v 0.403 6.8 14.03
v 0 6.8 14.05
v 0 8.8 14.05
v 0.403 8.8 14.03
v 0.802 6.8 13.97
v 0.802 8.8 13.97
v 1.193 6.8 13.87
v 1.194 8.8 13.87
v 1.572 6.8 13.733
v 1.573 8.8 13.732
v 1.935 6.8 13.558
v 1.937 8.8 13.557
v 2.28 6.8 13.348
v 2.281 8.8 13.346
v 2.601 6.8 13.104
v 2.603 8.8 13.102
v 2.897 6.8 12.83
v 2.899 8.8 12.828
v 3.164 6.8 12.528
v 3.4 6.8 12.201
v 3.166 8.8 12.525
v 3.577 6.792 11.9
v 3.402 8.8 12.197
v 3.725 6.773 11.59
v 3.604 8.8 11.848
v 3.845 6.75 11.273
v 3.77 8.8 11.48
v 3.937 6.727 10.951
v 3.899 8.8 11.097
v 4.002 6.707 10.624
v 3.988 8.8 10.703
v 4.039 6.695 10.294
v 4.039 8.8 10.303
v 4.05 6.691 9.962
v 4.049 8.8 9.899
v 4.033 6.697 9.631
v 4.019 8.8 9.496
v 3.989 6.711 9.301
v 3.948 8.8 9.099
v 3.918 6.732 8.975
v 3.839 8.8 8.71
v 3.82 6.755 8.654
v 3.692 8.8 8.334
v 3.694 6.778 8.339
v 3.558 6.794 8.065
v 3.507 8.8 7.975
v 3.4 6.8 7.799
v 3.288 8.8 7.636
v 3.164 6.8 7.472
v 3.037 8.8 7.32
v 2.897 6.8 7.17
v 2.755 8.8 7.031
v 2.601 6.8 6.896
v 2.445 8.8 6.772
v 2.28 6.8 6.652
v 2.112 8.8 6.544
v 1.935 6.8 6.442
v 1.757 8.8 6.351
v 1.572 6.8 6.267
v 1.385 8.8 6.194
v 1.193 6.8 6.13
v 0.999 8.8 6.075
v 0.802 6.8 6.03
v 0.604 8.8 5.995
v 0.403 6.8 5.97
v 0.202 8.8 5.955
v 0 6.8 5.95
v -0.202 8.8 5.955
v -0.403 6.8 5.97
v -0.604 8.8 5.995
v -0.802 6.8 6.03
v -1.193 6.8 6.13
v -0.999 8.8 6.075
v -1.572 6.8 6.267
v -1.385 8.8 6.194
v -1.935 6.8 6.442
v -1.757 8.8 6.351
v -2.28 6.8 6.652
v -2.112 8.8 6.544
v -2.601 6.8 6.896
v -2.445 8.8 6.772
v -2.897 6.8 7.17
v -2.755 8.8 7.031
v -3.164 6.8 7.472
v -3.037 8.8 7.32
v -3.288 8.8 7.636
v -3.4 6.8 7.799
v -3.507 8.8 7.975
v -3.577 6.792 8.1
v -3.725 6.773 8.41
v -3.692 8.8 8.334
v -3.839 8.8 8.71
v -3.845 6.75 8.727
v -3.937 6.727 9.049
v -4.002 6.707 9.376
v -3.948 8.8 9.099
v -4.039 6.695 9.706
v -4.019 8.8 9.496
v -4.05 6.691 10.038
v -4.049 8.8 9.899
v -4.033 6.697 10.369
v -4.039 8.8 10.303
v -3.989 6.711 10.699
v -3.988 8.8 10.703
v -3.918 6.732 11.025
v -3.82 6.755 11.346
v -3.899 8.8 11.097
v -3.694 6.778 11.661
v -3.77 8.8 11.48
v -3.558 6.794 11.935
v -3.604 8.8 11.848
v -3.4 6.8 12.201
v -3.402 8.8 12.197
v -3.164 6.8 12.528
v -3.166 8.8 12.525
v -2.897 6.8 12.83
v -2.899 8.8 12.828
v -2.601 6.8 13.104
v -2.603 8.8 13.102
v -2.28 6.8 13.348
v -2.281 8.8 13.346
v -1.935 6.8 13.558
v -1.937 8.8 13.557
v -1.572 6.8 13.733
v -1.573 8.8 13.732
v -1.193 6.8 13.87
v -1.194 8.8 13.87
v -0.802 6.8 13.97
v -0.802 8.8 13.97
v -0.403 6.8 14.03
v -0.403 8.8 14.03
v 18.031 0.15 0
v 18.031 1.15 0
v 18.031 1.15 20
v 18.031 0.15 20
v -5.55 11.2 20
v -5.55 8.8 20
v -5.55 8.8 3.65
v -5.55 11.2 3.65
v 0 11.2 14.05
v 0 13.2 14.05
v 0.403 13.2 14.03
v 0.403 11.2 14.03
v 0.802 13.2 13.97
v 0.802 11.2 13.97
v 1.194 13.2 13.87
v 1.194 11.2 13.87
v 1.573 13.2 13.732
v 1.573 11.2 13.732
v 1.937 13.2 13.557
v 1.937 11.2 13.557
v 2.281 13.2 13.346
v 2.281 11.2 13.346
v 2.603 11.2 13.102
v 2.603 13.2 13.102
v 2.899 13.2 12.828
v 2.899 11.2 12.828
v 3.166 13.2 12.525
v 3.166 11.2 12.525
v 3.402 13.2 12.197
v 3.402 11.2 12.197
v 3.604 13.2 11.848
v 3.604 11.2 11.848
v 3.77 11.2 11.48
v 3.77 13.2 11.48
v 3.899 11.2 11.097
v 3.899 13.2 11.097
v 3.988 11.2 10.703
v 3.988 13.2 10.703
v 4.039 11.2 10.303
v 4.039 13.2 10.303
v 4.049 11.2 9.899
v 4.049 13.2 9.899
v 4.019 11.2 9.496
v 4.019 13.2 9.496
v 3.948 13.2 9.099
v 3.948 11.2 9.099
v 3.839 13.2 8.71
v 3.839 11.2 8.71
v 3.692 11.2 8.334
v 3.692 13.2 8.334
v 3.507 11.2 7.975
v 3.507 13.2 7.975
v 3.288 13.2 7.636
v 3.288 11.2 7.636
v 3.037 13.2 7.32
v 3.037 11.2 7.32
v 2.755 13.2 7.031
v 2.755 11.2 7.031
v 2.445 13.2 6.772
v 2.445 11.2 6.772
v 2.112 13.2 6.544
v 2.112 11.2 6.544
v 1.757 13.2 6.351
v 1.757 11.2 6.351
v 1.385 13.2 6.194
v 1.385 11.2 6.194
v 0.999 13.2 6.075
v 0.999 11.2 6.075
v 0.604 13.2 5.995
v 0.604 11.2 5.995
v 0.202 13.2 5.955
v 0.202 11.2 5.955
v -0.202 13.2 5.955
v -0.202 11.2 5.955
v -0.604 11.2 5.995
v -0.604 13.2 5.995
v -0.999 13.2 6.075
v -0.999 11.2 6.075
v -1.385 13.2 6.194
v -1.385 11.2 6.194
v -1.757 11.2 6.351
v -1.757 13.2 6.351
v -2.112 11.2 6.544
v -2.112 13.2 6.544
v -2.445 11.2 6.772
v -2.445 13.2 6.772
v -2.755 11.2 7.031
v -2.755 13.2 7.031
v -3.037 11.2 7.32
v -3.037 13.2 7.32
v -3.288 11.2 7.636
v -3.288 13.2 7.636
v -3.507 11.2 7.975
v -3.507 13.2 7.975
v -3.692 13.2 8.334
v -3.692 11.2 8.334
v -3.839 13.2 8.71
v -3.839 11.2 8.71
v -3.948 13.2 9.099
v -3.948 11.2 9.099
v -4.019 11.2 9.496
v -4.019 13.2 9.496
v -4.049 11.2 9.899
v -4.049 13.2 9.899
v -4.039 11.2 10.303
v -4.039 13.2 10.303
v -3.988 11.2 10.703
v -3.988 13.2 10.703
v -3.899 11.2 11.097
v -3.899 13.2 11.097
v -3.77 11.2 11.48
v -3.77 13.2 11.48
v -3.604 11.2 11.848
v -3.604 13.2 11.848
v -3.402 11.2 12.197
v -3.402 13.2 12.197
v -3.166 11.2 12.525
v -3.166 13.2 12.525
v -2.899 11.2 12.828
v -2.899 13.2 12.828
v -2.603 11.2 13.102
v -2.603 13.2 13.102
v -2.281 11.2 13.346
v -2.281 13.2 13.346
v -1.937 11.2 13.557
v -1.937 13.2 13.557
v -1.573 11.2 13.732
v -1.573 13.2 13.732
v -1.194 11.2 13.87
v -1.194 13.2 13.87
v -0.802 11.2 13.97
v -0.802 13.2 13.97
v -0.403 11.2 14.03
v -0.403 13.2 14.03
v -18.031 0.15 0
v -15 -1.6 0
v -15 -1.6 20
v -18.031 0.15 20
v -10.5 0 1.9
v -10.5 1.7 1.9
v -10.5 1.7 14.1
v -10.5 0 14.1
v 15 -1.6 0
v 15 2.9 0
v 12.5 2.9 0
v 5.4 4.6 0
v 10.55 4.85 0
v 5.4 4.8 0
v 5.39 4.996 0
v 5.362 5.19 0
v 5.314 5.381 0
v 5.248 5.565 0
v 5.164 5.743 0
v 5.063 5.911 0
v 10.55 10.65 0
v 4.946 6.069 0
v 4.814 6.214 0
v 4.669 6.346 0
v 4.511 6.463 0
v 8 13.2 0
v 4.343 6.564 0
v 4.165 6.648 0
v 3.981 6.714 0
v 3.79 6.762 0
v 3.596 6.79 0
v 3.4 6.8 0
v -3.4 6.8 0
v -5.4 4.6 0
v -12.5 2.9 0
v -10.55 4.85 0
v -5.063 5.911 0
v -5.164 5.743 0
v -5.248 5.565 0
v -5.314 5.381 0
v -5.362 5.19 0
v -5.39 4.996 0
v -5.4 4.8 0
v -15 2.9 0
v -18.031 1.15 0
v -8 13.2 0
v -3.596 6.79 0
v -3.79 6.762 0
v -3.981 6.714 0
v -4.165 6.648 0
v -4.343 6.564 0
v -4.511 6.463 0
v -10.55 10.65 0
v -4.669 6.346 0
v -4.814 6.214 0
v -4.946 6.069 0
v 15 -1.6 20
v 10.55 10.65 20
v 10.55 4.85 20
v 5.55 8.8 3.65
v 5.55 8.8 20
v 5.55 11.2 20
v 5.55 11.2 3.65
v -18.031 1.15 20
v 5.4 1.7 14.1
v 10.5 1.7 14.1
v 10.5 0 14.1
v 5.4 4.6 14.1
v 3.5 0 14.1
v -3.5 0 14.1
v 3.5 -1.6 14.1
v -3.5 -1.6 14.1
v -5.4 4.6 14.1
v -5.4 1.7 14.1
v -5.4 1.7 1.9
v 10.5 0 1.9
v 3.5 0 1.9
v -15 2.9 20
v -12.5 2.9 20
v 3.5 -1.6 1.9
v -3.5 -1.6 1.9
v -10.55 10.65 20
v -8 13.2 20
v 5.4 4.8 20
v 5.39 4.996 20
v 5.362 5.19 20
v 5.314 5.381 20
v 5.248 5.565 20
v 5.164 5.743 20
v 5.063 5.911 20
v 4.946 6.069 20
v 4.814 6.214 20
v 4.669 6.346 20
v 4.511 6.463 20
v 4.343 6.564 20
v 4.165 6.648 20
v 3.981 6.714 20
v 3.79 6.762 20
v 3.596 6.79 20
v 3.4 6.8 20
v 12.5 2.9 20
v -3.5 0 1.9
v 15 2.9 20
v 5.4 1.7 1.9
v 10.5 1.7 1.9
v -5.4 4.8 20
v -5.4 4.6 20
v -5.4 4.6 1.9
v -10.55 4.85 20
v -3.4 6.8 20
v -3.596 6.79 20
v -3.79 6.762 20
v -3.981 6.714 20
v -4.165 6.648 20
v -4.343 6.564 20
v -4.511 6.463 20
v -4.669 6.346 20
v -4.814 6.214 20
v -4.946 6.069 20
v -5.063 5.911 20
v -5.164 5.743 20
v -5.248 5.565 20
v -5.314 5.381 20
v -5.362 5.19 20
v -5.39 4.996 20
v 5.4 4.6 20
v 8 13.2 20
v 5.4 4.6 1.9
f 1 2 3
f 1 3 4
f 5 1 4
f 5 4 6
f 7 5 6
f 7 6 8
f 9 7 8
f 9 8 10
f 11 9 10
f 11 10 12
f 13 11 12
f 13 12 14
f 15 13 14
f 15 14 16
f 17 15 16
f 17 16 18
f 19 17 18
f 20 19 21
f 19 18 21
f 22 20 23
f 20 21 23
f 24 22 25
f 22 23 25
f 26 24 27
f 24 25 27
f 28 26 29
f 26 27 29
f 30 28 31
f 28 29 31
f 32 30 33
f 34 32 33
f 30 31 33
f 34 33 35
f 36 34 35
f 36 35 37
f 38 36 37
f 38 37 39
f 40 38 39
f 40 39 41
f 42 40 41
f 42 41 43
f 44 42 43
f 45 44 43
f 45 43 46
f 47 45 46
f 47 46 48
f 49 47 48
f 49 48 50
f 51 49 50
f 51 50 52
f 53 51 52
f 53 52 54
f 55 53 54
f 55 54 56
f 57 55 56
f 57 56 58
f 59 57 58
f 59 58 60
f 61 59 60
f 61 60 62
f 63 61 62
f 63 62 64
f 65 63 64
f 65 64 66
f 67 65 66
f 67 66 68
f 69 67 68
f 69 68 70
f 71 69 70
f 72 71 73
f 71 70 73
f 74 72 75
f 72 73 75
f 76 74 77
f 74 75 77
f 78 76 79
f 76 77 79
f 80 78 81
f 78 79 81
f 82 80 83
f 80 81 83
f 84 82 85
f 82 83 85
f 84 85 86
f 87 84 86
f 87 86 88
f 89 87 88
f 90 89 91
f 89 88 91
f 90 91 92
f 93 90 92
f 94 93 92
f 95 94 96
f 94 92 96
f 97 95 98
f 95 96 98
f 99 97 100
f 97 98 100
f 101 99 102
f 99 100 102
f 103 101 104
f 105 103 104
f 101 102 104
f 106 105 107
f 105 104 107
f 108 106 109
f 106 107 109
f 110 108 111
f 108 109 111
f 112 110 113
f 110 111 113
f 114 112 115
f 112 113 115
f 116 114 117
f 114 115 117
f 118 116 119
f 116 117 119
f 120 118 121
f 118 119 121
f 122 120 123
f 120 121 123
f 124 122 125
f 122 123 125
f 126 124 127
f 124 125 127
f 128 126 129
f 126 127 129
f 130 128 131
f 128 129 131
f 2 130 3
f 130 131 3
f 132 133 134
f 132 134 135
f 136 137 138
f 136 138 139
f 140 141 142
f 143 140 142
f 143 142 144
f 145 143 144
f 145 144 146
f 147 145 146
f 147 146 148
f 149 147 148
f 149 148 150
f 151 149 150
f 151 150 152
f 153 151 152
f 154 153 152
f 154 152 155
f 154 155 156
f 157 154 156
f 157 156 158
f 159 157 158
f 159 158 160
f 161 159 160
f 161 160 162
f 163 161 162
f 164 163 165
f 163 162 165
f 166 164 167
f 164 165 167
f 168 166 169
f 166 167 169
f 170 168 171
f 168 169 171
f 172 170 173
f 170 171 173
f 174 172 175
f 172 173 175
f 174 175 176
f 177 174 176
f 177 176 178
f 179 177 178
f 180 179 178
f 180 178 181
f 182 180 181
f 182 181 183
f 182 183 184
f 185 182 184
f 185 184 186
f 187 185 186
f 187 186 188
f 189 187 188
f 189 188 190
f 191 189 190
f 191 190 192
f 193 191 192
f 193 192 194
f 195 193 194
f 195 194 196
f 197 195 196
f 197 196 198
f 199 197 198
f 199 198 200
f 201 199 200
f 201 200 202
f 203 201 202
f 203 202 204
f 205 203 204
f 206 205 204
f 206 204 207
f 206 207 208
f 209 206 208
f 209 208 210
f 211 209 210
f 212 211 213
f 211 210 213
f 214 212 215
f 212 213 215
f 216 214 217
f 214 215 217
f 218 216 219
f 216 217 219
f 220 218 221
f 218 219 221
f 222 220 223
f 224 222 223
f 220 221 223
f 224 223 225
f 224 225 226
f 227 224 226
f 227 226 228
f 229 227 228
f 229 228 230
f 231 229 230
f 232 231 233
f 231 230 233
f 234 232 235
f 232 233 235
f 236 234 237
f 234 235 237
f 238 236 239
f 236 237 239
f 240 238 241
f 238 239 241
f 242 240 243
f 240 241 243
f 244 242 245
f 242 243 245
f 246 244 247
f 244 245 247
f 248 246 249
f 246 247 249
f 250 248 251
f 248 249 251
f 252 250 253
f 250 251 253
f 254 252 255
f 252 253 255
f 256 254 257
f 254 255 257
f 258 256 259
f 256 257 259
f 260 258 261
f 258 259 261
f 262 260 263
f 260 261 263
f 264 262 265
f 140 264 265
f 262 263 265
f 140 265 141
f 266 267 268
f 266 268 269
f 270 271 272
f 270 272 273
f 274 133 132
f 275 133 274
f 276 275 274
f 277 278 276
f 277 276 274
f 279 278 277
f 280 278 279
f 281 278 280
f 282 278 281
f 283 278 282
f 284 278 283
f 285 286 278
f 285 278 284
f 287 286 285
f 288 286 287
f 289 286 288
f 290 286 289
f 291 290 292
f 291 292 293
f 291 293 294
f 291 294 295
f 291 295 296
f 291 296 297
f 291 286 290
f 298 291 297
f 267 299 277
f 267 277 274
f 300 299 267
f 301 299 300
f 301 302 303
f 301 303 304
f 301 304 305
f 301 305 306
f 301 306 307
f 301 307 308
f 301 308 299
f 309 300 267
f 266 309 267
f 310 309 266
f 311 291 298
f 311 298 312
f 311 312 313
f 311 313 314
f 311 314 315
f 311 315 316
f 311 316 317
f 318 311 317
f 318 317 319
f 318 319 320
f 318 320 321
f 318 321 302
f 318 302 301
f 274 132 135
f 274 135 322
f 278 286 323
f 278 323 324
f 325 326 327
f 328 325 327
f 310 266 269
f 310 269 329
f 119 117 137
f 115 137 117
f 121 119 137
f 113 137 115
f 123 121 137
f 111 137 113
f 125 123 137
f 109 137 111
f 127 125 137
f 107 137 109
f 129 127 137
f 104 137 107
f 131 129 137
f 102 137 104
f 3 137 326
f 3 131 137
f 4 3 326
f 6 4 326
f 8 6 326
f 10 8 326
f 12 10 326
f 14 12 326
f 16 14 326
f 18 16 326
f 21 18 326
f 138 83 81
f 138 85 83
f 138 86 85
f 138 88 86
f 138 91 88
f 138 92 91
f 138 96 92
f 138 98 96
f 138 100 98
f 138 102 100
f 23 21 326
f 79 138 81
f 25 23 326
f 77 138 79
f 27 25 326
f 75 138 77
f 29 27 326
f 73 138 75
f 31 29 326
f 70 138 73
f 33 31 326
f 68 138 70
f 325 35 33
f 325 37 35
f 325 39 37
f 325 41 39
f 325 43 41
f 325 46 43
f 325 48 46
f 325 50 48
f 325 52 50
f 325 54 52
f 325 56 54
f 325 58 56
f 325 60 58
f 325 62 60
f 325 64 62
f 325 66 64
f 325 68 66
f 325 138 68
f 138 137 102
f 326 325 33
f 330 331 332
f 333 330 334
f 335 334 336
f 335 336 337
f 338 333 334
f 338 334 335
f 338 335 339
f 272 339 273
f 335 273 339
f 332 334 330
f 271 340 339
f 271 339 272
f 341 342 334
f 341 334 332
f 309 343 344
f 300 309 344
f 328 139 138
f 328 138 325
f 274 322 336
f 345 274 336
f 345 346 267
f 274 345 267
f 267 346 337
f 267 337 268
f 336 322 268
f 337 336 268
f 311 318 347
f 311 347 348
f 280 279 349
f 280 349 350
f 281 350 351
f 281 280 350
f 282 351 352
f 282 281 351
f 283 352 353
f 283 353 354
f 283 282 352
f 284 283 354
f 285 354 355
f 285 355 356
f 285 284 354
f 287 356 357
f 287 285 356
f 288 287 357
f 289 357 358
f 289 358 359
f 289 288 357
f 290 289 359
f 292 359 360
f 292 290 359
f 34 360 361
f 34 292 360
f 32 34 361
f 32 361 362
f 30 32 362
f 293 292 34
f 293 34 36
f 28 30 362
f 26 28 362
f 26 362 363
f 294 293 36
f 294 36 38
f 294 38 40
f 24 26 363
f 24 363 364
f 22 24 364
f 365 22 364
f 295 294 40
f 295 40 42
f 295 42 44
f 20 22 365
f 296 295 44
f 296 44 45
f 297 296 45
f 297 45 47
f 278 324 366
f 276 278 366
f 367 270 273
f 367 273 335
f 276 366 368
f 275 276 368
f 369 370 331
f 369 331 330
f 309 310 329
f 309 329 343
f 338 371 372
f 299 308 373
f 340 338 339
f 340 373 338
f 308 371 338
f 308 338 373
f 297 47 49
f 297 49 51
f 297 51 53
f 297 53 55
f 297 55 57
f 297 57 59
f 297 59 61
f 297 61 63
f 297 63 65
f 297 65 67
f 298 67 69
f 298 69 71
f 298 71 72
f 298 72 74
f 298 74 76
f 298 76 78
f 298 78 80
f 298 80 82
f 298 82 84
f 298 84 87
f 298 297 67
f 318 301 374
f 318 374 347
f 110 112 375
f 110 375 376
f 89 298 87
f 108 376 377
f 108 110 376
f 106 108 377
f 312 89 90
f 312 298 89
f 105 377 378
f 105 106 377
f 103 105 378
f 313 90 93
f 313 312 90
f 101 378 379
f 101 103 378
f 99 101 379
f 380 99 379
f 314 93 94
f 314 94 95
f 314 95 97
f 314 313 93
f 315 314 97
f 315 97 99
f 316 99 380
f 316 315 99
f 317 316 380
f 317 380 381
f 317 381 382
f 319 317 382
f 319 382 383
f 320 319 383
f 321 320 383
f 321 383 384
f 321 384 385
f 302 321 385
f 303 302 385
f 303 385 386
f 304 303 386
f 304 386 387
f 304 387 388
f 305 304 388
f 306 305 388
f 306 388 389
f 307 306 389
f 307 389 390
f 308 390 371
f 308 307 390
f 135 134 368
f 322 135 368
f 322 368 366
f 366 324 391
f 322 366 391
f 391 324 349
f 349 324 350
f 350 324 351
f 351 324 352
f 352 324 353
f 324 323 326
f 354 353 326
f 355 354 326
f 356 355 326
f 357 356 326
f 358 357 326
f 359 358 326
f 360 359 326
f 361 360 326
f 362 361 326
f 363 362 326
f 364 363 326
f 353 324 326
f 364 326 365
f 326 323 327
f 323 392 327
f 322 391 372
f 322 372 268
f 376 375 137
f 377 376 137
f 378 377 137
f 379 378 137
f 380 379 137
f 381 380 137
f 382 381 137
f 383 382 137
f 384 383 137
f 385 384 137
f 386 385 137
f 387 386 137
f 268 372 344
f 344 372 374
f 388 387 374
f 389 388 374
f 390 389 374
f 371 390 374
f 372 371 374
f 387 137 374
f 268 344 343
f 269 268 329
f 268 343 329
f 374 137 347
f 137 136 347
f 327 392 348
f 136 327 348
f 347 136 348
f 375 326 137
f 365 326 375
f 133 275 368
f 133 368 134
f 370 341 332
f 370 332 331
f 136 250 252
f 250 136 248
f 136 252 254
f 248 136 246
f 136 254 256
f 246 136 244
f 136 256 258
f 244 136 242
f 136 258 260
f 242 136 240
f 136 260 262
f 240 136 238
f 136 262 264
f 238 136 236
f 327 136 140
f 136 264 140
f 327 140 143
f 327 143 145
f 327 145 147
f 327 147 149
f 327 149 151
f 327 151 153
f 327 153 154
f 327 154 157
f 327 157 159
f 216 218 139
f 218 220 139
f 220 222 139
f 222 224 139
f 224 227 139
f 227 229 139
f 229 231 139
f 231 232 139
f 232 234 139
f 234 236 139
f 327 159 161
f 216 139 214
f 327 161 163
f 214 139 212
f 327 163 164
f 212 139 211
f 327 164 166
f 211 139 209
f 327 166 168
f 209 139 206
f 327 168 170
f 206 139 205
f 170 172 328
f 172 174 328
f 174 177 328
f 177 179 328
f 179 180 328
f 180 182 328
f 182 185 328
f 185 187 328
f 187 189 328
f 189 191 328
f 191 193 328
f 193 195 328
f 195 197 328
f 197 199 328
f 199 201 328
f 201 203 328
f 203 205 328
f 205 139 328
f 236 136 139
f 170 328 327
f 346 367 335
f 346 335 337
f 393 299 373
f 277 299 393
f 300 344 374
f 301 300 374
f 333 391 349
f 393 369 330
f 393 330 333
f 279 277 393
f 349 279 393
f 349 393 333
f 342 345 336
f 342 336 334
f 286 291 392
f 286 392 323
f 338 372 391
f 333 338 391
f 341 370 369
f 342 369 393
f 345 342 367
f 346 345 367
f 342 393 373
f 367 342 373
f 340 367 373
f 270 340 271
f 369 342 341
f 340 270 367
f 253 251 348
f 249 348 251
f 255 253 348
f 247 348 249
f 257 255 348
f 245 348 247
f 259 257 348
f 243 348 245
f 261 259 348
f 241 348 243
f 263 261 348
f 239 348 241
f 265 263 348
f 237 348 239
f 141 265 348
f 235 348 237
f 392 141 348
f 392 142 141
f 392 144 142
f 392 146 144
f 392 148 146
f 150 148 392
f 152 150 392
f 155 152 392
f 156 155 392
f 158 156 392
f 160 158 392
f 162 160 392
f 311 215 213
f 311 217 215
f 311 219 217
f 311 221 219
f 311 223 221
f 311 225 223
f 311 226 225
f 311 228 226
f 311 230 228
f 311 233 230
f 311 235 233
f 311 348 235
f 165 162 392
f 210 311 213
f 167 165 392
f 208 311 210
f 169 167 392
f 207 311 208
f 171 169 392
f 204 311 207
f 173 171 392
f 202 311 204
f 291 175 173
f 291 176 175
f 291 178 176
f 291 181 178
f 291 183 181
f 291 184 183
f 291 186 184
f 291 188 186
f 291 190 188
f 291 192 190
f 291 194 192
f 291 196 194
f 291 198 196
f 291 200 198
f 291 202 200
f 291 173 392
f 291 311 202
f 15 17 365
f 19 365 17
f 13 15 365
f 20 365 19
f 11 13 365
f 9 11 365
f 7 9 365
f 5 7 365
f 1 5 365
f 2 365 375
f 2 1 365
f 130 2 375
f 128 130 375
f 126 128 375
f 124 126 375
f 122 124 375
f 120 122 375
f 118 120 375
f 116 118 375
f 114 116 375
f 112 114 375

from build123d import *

# Parameters (mm, degrees)
SKETCH1_W           = 11.1
SKETCH1_H           = 2.4
BOSS_EXTRUDE1_DEPTH = 20
CUT_EXTRUDE1_REACH  = 32.727
SKETCH2_R           = 4.05
SKETCH4_W           = 11.1
SKETCH4_H           = 3.65
BOSS_EXTRUDE3_DEPTH = 4.4
BOSS_EXTRUDE4_DEPTH = 1.9
BOSS_EXTRUDE5_DEPTH = 5.9


with BuildPart() as part:
    # Sketch1 → Boss-Extrude1 (new body)
    with BuildSketch(Plane.XY):
        with BuildLine():
            Line((-10.5, 0), (-3.5, 0))
            Line((-3.5, 0), (-3.5, -1.6))
            Line((-3.5, -1.6), (-15, -1.6))
            Line((-15, -1.6), (-18.031088913, 0.15))
            Line((-18.031088913, 0.15), (-18.031088913, 1.15))
            Line((-18.031088913, 1.15), (-15, 2.9))
            Line((-15, 2.9), (-12.5, 2.9))
            Line((-12.5, 2.9), (-10.55, 4.85))
            Line((-10.55, 4.85), (-10.55, 10.65))
            Line((-10.55, 10.65), (-8, 13.2))
            Line((-8, 13.2), (8, 13.2))
            Line((8, 13.2), (10.55, 10.65))
            Line((10.55, 10.65), (10.55, 4.85))
            Line((10.55, 4.85), (12.5, 2.9))
            Line((12.5, 2.9), (15, 2.9))
            Line((15, 2.9), (18.031088913, 1.15))
            Line((18.031088913, 1.15), (18.031088913, 0.15))
            Line((18.031088913, 0.15), (15, -1.6))
            Line((15, -1.6), (3.5, -1.6))
            Line((3.5, -1.6), (3.5, 0))
            Line((3.5, 0), (10.5, 0))
            Line((10.5, 0), (10.5, 1.7))
            Line((10.5, 1.7), (5.4, 1.7))
            Line((5.4, 1.7), (5.4, 4.8))
            ThreePointArc((5.4, 4.8), (4.814213562, 6.214213562), (3.4, 6.8))
            Line((3.4, 6.8), (-3.4, 6.8))
            ThreePointArc((-3.4, 6.8), (-4.814213562, 6.214213562), (-5.4, 4.8))
            Line((-5.4, 4.8), (-5.4, 1.7))
            Line((-5.4, 1.7), (-10.5, 1.7))
            Line((-10.5, 1.7), (-10.5, 0))
        make_face()
        with Locations((0, 10)):
            Rectangle(SKETCH1_W, SKETCH1_H, mode=Mode.SUBTRACT)
    extrude(amount=BOSS_EXTRUDE1_DEPTH)

    # Cut-Extrude1: up to this face of the body (flat: up to its plane)
    cut_extrude1_end = Plane(part.part.faces().sort_by_distance((7, 0, 10))[0])
    # Sketch2 → Cut-Extrude1 (cut, up to the picked face)
    with BuildSketch(Plane(origin=(0, 13.2, 0), x_dir=(1, 0, 0), z_dir=(0, 1, 0)), mode=Mode.PRIVATE) as cut_extrude1_sk1:
        with Locations(Location((0, -10, 0), (0, 0, 270))):
            Circle(SKETCH2_R)
    cut_extrude1_tool1 = split(extrude(cut_extrude1_sk1.sketch, amount=-CUT_EXTRUDE1_REACH, mode=Mode.PRIVATE), bisect_by=cut_extrude1_end, keep=Keep.BOTH, mode=Mode.PRIVATE)
    add(cut_extrude1_tool1.solids().sort_by(Axis((0, 13.2, 10), (0, -1, 0)))[0], mode=Mode.SUBTRACT)

    # Sketch4 → Boss-Extrude3 (add)
    with BuildSketch(Plane(origin=(0, 13.2, 0), x_dir=(1, 0, 0), z_dir=(0, 1, 0))):
        with Locations((0, -1.825)):
            Rectangle(SKETCH4_W, SKETCH4_H)
    extrude(amount=-BOSS_EXTRUDE3_DEPTH)

    # Sketch5 → Boss-Extrude4 (add)
    with BuildSketch(Plane(origin=(0, 0, 0), x_dir=(-1, 0, 0), z_dir=(0, 0, -1))):
        Polygon((-10.5, 1.7), (-10.5, -1.6), (10.5, -1.6), (10.5, 1.7), (5.4, 1.7), (5.4, 4.6), (-5.4, 4.6), (-5.4, 1.7), align=None)
    extrude(amount=-BOSS_EXTRUDE4_DEPTH)

    # Sketch6 → Boss-Extrude5 (add)
    with BuildSketch(Plane.XY.offset(20)):
        Polygon((-3.5, -1.6), (-3.5, 0), (-10.5, 0), (-10.5, 1.7), (-5.4, 1.7), (-5.4, 4.6), (5.4, 4.6), (5.4, 1.7), (10.5, 1.7), (10.5, 0), (3.5, 0), (3.5, -1.6), align=None)
    extrude(amount=-BOSS_EXTRUDE5_DEPTH)


solid = part.part
